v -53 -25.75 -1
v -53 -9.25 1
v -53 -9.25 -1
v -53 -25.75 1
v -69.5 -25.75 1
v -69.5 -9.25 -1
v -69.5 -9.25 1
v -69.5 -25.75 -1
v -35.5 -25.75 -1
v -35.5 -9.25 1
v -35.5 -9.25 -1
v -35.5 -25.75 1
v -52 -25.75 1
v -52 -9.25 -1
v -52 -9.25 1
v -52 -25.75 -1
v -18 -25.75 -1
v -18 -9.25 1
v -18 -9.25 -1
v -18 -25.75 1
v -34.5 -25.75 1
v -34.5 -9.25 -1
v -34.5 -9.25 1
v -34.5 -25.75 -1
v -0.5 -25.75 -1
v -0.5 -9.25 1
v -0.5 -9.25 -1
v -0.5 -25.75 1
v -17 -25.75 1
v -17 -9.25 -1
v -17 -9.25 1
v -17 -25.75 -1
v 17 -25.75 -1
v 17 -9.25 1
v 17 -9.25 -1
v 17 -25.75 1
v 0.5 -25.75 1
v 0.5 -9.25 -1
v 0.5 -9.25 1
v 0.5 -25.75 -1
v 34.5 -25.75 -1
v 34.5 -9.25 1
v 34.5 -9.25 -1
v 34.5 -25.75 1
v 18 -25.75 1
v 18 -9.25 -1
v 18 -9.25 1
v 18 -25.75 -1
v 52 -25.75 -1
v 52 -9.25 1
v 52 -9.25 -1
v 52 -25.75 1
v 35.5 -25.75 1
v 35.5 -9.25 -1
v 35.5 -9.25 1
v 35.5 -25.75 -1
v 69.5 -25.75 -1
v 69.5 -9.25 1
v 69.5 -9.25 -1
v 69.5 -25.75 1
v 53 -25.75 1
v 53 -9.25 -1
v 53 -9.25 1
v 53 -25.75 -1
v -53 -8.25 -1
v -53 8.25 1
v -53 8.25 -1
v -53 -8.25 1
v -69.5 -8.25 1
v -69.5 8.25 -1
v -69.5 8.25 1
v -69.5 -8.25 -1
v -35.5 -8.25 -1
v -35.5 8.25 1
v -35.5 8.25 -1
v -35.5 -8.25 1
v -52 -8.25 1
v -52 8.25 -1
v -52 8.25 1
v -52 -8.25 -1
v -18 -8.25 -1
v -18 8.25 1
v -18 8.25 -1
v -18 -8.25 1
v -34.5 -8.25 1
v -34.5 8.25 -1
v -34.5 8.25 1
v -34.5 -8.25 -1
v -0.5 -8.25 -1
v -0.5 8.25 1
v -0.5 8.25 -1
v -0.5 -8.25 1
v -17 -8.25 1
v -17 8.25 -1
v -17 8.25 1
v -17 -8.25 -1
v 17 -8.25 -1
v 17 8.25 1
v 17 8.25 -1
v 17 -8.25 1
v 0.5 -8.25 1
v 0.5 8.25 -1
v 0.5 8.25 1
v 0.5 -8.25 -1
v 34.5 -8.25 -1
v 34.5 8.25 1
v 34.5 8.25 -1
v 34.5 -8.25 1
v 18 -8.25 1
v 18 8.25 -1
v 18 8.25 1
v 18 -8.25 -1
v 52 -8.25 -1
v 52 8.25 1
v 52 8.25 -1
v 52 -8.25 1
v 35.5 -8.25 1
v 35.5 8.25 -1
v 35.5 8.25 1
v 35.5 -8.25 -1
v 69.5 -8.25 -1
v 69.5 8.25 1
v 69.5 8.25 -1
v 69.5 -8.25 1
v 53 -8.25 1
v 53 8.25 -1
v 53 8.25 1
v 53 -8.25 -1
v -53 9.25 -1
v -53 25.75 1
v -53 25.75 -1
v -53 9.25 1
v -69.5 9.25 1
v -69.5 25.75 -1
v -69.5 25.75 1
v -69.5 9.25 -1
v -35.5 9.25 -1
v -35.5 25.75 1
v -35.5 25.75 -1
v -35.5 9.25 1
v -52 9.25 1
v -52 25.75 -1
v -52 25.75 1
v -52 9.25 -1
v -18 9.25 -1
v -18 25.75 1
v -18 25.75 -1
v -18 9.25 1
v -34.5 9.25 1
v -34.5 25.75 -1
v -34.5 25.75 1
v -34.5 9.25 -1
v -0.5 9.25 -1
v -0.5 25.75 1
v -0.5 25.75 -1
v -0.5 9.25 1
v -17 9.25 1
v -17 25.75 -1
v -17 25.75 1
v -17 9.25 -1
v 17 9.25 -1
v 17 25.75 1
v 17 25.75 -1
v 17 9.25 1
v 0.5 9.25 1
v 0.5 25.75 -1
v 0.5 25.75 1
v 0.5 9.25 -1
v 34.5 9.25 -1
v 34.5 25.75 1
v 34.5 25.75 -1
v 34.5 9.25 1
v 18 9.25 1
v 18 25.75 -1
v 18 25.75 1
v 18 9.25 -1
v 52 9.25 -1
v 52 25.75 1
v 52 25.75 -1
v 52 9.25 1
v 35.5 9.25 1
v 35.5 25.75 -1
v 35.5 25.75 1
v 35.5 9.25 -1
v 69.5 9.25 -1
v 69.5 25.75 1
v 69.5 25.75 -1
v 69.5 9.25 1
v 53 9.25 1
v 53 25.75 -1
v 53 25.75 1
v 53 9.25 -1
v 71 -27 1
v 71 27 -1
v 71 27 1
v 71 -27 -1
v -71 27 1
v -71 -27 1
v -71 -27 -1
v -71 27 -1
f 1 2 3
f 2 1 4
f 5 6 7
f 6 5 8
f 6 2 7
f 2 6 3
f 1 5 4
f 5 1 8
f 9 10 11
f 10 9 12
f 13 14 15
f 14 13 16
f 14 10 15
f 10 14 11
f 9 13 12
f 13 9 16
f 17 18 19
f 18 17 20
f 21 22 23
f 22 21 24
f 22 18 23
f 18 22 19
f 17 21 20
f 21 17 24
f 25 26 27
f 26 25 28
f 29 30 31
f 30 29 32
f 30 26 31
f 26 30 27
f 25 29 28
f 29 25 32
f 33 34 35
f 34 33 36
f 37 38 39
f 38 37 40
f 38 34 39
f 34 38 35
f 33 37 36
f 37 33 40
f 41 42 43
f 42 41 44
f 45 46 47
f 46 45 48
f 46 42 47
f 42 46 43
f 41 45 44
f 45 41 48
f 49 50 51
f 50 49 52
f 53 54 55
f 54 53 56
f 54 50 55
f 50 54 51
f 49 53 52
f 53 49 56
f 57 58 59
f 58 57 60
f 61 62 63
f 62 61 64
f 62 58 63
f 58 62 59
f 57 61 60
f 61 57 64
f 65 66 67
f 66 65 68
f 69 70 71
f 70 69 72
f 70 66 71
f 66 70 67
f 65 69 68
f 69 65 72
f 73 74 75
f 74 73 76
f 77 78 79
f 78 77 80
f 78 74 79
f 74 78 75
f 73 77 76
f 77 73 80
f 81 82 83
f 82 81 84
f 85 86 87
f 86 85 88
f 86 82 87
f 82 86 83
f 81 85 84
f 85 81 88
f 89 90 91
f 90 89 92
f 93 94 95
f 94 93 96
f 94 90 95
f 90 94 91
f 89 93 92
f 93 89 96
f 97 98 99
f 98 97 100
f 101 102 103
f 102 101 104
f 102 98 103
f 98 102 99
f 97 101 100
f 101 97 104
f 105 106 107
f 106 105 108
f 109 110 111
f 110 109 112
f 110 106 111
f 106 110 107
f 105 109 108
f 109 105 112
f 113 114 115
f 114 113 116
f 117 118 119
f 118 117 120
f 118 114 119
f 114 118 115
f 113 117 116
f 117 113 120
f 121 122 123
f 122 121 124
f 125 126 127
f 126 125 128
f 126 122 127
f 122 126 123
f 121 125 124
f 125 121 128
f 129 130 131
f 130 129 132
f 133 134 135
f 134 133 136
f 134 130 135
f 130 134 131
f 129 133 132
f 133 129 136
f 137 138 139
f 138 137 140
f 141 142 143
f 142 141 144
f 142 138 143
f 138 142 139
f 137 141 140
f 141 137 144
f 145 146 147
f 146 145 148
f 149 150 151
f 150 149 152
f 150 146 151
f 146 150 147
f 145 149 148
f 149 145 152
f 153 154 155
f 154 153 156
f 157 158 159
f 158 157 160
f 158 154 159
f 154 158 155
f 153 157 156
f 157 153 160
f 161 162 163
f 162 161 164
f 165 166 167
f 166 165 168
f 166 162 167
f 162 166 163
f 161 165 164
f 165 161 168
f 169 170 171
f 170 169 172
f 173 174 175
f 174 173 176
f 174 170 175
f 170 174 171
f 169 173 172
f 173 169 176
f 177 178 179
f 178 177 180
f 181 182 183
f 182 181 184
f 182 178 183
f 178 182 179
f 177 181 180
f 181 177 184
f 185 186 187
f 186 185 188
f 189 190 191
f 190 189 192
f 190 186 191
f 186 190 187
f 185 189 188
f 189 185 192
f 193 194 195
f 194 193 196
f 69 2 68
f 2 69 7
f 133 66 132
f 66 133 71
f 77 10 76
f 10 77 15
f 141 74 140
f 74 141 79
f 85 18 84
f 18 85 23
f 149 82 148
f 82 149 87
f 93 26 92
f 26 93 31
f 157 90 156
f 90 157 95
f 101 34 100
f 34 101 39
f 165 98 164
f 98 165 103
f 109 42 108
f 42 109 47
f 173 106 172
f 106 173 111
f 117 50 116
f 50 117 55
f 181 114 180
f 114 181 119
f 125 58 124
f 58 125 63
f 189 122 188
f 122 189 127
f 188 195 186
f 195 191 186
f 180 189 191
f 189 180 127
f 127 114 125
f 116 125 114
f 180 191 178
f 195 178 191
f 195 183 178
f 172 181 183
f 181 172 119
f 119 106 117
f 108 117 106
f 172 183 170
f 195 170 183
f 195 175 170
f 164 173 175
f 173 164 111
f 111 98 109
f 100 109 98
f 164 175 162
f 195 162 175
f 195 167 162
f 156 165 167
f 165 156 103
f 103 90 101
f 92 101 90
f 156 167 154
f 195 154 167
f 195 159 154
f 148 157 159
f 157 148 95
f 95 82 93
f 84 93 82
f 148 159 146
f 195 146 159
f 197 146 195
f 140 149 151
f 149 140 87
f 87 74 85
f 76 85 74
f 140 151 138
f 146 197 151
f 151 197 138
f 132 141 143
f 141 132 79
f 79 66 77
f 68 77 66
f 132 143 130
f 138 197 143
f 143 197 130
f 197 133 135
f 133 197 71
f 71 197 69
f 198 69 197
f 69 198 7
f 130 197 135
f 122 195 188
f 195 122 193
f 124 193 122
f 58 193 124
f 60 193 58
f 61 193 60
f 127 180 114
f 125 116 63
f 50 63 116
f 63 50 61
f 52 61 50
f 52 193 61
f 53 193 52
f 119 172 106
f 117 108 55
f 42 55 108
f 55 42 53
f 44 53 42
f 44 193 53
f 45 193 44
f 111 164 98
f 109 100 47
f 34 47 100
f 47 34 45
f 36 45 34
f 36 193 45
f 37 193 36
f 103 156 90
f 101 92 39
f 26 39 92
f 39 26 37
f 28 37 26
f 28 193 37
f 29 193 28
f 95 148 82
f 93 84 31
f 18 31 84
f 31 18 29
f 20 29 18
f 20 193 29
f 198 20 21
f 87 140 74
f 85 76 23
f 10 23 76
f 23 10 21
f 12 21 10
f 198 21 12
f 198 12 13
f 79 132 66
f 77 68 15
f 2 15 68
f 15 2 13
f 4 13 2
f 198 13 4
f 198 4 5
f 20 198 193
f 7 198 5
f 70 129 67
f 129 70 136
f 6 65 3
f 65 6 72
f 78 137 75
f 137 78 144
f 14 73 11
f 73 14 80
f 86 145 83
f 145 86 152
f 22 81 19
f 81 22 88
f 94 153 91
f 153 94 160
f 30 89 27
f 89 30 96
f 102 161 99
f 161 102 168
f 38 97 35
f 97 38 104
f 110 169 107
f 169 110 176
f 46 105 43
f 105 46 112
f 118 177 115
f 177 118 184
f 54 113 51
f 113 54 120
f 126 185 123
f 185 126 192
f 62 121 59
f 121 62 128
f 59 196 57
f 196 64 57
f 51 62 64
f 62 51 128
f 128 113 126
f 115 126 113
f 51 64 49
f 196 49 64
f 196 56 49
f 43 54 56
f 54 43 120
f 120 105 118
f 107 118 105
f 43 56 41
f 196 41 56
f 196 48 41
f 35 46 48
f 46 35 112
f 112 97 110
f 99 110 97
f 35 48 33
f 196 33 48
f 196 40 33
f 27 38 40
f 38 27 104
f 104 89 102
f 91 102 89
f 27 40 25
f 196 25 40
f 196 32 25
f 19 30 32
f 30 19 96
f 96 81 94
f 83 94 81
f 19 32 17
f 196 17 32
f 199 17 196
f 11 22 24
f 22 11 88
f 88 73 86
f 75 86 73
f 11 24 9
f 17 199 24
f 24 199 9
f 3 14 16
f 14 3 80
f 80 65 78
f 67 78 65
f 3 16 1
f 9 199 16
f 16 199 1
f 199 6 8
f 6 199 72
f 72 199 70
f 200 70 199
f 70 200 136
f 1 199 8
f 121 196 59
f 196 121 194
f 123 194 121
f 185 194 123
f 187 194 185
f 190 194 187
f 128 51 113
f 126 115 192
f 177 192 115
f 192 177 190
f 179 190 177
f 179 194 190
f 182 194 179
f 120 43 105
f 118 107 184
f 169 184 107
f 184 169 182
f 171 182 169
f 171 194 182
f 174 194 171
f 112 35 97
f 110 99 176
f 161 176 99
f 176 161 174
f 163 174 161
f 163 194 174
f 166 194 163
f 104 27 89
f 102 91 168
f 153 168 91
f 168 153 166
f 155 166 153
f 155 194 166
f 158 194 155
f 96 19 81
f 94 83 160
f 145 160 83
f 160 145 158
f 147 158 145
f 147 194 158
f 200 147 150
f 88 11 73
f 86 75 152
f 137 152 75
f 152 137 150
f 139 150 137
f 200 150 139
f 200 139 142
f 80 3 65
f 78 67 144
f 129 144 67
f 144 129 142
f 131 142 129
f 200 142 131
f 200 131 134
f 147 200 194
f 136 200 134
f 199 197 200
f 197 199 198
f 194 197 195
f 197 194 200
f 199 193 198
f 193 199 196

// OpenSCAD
// Imhotep Burial Creator

// The size of the Cubes, in millimeters
cube_size = 15;

// How heigh should the burial grid be?
chamber_size_h = 2;

// The distance between the cube holes
cube_distance = 1;

chamber_size_w = 9 * ( cube_size + cube_distance ) - cube_distance * 2;
chamber_size_l = 3.5 * ( cube_size + cube_distance ) - cube_distance * 2;

cube_fit = 1.1;

cube_hole_size = cube_size * cube_fit;

difference() { 
    // Raft
    color("gray")
        cube(
            [
                chamber_size_w,
                chamber_size_l,
                chamber_size_h
            ],
            true );

    // Cube Holes
    for( y = [ 0 : 2 ] ) {
        for( x = [ 0 : 7 ] ) {
            translate(
                [
                    ( -4 + x ) * ( cube_hole_size + cube_distance ) + ( cube_hole_size + cube_distance ) / 2,
                    ( -1.5 + y ) * ( cube_hole_size + cube_distance ) + + ( cube_hole_size + cube_distance ) / 2,
                    cube_hole_size / 4
                ])
                {
                    cube(
                        [
                            cube_hole_size,
                            cube_hole_size,
                            cube_hole_size
                        ],
                        true);
                }
        }
    }
}
